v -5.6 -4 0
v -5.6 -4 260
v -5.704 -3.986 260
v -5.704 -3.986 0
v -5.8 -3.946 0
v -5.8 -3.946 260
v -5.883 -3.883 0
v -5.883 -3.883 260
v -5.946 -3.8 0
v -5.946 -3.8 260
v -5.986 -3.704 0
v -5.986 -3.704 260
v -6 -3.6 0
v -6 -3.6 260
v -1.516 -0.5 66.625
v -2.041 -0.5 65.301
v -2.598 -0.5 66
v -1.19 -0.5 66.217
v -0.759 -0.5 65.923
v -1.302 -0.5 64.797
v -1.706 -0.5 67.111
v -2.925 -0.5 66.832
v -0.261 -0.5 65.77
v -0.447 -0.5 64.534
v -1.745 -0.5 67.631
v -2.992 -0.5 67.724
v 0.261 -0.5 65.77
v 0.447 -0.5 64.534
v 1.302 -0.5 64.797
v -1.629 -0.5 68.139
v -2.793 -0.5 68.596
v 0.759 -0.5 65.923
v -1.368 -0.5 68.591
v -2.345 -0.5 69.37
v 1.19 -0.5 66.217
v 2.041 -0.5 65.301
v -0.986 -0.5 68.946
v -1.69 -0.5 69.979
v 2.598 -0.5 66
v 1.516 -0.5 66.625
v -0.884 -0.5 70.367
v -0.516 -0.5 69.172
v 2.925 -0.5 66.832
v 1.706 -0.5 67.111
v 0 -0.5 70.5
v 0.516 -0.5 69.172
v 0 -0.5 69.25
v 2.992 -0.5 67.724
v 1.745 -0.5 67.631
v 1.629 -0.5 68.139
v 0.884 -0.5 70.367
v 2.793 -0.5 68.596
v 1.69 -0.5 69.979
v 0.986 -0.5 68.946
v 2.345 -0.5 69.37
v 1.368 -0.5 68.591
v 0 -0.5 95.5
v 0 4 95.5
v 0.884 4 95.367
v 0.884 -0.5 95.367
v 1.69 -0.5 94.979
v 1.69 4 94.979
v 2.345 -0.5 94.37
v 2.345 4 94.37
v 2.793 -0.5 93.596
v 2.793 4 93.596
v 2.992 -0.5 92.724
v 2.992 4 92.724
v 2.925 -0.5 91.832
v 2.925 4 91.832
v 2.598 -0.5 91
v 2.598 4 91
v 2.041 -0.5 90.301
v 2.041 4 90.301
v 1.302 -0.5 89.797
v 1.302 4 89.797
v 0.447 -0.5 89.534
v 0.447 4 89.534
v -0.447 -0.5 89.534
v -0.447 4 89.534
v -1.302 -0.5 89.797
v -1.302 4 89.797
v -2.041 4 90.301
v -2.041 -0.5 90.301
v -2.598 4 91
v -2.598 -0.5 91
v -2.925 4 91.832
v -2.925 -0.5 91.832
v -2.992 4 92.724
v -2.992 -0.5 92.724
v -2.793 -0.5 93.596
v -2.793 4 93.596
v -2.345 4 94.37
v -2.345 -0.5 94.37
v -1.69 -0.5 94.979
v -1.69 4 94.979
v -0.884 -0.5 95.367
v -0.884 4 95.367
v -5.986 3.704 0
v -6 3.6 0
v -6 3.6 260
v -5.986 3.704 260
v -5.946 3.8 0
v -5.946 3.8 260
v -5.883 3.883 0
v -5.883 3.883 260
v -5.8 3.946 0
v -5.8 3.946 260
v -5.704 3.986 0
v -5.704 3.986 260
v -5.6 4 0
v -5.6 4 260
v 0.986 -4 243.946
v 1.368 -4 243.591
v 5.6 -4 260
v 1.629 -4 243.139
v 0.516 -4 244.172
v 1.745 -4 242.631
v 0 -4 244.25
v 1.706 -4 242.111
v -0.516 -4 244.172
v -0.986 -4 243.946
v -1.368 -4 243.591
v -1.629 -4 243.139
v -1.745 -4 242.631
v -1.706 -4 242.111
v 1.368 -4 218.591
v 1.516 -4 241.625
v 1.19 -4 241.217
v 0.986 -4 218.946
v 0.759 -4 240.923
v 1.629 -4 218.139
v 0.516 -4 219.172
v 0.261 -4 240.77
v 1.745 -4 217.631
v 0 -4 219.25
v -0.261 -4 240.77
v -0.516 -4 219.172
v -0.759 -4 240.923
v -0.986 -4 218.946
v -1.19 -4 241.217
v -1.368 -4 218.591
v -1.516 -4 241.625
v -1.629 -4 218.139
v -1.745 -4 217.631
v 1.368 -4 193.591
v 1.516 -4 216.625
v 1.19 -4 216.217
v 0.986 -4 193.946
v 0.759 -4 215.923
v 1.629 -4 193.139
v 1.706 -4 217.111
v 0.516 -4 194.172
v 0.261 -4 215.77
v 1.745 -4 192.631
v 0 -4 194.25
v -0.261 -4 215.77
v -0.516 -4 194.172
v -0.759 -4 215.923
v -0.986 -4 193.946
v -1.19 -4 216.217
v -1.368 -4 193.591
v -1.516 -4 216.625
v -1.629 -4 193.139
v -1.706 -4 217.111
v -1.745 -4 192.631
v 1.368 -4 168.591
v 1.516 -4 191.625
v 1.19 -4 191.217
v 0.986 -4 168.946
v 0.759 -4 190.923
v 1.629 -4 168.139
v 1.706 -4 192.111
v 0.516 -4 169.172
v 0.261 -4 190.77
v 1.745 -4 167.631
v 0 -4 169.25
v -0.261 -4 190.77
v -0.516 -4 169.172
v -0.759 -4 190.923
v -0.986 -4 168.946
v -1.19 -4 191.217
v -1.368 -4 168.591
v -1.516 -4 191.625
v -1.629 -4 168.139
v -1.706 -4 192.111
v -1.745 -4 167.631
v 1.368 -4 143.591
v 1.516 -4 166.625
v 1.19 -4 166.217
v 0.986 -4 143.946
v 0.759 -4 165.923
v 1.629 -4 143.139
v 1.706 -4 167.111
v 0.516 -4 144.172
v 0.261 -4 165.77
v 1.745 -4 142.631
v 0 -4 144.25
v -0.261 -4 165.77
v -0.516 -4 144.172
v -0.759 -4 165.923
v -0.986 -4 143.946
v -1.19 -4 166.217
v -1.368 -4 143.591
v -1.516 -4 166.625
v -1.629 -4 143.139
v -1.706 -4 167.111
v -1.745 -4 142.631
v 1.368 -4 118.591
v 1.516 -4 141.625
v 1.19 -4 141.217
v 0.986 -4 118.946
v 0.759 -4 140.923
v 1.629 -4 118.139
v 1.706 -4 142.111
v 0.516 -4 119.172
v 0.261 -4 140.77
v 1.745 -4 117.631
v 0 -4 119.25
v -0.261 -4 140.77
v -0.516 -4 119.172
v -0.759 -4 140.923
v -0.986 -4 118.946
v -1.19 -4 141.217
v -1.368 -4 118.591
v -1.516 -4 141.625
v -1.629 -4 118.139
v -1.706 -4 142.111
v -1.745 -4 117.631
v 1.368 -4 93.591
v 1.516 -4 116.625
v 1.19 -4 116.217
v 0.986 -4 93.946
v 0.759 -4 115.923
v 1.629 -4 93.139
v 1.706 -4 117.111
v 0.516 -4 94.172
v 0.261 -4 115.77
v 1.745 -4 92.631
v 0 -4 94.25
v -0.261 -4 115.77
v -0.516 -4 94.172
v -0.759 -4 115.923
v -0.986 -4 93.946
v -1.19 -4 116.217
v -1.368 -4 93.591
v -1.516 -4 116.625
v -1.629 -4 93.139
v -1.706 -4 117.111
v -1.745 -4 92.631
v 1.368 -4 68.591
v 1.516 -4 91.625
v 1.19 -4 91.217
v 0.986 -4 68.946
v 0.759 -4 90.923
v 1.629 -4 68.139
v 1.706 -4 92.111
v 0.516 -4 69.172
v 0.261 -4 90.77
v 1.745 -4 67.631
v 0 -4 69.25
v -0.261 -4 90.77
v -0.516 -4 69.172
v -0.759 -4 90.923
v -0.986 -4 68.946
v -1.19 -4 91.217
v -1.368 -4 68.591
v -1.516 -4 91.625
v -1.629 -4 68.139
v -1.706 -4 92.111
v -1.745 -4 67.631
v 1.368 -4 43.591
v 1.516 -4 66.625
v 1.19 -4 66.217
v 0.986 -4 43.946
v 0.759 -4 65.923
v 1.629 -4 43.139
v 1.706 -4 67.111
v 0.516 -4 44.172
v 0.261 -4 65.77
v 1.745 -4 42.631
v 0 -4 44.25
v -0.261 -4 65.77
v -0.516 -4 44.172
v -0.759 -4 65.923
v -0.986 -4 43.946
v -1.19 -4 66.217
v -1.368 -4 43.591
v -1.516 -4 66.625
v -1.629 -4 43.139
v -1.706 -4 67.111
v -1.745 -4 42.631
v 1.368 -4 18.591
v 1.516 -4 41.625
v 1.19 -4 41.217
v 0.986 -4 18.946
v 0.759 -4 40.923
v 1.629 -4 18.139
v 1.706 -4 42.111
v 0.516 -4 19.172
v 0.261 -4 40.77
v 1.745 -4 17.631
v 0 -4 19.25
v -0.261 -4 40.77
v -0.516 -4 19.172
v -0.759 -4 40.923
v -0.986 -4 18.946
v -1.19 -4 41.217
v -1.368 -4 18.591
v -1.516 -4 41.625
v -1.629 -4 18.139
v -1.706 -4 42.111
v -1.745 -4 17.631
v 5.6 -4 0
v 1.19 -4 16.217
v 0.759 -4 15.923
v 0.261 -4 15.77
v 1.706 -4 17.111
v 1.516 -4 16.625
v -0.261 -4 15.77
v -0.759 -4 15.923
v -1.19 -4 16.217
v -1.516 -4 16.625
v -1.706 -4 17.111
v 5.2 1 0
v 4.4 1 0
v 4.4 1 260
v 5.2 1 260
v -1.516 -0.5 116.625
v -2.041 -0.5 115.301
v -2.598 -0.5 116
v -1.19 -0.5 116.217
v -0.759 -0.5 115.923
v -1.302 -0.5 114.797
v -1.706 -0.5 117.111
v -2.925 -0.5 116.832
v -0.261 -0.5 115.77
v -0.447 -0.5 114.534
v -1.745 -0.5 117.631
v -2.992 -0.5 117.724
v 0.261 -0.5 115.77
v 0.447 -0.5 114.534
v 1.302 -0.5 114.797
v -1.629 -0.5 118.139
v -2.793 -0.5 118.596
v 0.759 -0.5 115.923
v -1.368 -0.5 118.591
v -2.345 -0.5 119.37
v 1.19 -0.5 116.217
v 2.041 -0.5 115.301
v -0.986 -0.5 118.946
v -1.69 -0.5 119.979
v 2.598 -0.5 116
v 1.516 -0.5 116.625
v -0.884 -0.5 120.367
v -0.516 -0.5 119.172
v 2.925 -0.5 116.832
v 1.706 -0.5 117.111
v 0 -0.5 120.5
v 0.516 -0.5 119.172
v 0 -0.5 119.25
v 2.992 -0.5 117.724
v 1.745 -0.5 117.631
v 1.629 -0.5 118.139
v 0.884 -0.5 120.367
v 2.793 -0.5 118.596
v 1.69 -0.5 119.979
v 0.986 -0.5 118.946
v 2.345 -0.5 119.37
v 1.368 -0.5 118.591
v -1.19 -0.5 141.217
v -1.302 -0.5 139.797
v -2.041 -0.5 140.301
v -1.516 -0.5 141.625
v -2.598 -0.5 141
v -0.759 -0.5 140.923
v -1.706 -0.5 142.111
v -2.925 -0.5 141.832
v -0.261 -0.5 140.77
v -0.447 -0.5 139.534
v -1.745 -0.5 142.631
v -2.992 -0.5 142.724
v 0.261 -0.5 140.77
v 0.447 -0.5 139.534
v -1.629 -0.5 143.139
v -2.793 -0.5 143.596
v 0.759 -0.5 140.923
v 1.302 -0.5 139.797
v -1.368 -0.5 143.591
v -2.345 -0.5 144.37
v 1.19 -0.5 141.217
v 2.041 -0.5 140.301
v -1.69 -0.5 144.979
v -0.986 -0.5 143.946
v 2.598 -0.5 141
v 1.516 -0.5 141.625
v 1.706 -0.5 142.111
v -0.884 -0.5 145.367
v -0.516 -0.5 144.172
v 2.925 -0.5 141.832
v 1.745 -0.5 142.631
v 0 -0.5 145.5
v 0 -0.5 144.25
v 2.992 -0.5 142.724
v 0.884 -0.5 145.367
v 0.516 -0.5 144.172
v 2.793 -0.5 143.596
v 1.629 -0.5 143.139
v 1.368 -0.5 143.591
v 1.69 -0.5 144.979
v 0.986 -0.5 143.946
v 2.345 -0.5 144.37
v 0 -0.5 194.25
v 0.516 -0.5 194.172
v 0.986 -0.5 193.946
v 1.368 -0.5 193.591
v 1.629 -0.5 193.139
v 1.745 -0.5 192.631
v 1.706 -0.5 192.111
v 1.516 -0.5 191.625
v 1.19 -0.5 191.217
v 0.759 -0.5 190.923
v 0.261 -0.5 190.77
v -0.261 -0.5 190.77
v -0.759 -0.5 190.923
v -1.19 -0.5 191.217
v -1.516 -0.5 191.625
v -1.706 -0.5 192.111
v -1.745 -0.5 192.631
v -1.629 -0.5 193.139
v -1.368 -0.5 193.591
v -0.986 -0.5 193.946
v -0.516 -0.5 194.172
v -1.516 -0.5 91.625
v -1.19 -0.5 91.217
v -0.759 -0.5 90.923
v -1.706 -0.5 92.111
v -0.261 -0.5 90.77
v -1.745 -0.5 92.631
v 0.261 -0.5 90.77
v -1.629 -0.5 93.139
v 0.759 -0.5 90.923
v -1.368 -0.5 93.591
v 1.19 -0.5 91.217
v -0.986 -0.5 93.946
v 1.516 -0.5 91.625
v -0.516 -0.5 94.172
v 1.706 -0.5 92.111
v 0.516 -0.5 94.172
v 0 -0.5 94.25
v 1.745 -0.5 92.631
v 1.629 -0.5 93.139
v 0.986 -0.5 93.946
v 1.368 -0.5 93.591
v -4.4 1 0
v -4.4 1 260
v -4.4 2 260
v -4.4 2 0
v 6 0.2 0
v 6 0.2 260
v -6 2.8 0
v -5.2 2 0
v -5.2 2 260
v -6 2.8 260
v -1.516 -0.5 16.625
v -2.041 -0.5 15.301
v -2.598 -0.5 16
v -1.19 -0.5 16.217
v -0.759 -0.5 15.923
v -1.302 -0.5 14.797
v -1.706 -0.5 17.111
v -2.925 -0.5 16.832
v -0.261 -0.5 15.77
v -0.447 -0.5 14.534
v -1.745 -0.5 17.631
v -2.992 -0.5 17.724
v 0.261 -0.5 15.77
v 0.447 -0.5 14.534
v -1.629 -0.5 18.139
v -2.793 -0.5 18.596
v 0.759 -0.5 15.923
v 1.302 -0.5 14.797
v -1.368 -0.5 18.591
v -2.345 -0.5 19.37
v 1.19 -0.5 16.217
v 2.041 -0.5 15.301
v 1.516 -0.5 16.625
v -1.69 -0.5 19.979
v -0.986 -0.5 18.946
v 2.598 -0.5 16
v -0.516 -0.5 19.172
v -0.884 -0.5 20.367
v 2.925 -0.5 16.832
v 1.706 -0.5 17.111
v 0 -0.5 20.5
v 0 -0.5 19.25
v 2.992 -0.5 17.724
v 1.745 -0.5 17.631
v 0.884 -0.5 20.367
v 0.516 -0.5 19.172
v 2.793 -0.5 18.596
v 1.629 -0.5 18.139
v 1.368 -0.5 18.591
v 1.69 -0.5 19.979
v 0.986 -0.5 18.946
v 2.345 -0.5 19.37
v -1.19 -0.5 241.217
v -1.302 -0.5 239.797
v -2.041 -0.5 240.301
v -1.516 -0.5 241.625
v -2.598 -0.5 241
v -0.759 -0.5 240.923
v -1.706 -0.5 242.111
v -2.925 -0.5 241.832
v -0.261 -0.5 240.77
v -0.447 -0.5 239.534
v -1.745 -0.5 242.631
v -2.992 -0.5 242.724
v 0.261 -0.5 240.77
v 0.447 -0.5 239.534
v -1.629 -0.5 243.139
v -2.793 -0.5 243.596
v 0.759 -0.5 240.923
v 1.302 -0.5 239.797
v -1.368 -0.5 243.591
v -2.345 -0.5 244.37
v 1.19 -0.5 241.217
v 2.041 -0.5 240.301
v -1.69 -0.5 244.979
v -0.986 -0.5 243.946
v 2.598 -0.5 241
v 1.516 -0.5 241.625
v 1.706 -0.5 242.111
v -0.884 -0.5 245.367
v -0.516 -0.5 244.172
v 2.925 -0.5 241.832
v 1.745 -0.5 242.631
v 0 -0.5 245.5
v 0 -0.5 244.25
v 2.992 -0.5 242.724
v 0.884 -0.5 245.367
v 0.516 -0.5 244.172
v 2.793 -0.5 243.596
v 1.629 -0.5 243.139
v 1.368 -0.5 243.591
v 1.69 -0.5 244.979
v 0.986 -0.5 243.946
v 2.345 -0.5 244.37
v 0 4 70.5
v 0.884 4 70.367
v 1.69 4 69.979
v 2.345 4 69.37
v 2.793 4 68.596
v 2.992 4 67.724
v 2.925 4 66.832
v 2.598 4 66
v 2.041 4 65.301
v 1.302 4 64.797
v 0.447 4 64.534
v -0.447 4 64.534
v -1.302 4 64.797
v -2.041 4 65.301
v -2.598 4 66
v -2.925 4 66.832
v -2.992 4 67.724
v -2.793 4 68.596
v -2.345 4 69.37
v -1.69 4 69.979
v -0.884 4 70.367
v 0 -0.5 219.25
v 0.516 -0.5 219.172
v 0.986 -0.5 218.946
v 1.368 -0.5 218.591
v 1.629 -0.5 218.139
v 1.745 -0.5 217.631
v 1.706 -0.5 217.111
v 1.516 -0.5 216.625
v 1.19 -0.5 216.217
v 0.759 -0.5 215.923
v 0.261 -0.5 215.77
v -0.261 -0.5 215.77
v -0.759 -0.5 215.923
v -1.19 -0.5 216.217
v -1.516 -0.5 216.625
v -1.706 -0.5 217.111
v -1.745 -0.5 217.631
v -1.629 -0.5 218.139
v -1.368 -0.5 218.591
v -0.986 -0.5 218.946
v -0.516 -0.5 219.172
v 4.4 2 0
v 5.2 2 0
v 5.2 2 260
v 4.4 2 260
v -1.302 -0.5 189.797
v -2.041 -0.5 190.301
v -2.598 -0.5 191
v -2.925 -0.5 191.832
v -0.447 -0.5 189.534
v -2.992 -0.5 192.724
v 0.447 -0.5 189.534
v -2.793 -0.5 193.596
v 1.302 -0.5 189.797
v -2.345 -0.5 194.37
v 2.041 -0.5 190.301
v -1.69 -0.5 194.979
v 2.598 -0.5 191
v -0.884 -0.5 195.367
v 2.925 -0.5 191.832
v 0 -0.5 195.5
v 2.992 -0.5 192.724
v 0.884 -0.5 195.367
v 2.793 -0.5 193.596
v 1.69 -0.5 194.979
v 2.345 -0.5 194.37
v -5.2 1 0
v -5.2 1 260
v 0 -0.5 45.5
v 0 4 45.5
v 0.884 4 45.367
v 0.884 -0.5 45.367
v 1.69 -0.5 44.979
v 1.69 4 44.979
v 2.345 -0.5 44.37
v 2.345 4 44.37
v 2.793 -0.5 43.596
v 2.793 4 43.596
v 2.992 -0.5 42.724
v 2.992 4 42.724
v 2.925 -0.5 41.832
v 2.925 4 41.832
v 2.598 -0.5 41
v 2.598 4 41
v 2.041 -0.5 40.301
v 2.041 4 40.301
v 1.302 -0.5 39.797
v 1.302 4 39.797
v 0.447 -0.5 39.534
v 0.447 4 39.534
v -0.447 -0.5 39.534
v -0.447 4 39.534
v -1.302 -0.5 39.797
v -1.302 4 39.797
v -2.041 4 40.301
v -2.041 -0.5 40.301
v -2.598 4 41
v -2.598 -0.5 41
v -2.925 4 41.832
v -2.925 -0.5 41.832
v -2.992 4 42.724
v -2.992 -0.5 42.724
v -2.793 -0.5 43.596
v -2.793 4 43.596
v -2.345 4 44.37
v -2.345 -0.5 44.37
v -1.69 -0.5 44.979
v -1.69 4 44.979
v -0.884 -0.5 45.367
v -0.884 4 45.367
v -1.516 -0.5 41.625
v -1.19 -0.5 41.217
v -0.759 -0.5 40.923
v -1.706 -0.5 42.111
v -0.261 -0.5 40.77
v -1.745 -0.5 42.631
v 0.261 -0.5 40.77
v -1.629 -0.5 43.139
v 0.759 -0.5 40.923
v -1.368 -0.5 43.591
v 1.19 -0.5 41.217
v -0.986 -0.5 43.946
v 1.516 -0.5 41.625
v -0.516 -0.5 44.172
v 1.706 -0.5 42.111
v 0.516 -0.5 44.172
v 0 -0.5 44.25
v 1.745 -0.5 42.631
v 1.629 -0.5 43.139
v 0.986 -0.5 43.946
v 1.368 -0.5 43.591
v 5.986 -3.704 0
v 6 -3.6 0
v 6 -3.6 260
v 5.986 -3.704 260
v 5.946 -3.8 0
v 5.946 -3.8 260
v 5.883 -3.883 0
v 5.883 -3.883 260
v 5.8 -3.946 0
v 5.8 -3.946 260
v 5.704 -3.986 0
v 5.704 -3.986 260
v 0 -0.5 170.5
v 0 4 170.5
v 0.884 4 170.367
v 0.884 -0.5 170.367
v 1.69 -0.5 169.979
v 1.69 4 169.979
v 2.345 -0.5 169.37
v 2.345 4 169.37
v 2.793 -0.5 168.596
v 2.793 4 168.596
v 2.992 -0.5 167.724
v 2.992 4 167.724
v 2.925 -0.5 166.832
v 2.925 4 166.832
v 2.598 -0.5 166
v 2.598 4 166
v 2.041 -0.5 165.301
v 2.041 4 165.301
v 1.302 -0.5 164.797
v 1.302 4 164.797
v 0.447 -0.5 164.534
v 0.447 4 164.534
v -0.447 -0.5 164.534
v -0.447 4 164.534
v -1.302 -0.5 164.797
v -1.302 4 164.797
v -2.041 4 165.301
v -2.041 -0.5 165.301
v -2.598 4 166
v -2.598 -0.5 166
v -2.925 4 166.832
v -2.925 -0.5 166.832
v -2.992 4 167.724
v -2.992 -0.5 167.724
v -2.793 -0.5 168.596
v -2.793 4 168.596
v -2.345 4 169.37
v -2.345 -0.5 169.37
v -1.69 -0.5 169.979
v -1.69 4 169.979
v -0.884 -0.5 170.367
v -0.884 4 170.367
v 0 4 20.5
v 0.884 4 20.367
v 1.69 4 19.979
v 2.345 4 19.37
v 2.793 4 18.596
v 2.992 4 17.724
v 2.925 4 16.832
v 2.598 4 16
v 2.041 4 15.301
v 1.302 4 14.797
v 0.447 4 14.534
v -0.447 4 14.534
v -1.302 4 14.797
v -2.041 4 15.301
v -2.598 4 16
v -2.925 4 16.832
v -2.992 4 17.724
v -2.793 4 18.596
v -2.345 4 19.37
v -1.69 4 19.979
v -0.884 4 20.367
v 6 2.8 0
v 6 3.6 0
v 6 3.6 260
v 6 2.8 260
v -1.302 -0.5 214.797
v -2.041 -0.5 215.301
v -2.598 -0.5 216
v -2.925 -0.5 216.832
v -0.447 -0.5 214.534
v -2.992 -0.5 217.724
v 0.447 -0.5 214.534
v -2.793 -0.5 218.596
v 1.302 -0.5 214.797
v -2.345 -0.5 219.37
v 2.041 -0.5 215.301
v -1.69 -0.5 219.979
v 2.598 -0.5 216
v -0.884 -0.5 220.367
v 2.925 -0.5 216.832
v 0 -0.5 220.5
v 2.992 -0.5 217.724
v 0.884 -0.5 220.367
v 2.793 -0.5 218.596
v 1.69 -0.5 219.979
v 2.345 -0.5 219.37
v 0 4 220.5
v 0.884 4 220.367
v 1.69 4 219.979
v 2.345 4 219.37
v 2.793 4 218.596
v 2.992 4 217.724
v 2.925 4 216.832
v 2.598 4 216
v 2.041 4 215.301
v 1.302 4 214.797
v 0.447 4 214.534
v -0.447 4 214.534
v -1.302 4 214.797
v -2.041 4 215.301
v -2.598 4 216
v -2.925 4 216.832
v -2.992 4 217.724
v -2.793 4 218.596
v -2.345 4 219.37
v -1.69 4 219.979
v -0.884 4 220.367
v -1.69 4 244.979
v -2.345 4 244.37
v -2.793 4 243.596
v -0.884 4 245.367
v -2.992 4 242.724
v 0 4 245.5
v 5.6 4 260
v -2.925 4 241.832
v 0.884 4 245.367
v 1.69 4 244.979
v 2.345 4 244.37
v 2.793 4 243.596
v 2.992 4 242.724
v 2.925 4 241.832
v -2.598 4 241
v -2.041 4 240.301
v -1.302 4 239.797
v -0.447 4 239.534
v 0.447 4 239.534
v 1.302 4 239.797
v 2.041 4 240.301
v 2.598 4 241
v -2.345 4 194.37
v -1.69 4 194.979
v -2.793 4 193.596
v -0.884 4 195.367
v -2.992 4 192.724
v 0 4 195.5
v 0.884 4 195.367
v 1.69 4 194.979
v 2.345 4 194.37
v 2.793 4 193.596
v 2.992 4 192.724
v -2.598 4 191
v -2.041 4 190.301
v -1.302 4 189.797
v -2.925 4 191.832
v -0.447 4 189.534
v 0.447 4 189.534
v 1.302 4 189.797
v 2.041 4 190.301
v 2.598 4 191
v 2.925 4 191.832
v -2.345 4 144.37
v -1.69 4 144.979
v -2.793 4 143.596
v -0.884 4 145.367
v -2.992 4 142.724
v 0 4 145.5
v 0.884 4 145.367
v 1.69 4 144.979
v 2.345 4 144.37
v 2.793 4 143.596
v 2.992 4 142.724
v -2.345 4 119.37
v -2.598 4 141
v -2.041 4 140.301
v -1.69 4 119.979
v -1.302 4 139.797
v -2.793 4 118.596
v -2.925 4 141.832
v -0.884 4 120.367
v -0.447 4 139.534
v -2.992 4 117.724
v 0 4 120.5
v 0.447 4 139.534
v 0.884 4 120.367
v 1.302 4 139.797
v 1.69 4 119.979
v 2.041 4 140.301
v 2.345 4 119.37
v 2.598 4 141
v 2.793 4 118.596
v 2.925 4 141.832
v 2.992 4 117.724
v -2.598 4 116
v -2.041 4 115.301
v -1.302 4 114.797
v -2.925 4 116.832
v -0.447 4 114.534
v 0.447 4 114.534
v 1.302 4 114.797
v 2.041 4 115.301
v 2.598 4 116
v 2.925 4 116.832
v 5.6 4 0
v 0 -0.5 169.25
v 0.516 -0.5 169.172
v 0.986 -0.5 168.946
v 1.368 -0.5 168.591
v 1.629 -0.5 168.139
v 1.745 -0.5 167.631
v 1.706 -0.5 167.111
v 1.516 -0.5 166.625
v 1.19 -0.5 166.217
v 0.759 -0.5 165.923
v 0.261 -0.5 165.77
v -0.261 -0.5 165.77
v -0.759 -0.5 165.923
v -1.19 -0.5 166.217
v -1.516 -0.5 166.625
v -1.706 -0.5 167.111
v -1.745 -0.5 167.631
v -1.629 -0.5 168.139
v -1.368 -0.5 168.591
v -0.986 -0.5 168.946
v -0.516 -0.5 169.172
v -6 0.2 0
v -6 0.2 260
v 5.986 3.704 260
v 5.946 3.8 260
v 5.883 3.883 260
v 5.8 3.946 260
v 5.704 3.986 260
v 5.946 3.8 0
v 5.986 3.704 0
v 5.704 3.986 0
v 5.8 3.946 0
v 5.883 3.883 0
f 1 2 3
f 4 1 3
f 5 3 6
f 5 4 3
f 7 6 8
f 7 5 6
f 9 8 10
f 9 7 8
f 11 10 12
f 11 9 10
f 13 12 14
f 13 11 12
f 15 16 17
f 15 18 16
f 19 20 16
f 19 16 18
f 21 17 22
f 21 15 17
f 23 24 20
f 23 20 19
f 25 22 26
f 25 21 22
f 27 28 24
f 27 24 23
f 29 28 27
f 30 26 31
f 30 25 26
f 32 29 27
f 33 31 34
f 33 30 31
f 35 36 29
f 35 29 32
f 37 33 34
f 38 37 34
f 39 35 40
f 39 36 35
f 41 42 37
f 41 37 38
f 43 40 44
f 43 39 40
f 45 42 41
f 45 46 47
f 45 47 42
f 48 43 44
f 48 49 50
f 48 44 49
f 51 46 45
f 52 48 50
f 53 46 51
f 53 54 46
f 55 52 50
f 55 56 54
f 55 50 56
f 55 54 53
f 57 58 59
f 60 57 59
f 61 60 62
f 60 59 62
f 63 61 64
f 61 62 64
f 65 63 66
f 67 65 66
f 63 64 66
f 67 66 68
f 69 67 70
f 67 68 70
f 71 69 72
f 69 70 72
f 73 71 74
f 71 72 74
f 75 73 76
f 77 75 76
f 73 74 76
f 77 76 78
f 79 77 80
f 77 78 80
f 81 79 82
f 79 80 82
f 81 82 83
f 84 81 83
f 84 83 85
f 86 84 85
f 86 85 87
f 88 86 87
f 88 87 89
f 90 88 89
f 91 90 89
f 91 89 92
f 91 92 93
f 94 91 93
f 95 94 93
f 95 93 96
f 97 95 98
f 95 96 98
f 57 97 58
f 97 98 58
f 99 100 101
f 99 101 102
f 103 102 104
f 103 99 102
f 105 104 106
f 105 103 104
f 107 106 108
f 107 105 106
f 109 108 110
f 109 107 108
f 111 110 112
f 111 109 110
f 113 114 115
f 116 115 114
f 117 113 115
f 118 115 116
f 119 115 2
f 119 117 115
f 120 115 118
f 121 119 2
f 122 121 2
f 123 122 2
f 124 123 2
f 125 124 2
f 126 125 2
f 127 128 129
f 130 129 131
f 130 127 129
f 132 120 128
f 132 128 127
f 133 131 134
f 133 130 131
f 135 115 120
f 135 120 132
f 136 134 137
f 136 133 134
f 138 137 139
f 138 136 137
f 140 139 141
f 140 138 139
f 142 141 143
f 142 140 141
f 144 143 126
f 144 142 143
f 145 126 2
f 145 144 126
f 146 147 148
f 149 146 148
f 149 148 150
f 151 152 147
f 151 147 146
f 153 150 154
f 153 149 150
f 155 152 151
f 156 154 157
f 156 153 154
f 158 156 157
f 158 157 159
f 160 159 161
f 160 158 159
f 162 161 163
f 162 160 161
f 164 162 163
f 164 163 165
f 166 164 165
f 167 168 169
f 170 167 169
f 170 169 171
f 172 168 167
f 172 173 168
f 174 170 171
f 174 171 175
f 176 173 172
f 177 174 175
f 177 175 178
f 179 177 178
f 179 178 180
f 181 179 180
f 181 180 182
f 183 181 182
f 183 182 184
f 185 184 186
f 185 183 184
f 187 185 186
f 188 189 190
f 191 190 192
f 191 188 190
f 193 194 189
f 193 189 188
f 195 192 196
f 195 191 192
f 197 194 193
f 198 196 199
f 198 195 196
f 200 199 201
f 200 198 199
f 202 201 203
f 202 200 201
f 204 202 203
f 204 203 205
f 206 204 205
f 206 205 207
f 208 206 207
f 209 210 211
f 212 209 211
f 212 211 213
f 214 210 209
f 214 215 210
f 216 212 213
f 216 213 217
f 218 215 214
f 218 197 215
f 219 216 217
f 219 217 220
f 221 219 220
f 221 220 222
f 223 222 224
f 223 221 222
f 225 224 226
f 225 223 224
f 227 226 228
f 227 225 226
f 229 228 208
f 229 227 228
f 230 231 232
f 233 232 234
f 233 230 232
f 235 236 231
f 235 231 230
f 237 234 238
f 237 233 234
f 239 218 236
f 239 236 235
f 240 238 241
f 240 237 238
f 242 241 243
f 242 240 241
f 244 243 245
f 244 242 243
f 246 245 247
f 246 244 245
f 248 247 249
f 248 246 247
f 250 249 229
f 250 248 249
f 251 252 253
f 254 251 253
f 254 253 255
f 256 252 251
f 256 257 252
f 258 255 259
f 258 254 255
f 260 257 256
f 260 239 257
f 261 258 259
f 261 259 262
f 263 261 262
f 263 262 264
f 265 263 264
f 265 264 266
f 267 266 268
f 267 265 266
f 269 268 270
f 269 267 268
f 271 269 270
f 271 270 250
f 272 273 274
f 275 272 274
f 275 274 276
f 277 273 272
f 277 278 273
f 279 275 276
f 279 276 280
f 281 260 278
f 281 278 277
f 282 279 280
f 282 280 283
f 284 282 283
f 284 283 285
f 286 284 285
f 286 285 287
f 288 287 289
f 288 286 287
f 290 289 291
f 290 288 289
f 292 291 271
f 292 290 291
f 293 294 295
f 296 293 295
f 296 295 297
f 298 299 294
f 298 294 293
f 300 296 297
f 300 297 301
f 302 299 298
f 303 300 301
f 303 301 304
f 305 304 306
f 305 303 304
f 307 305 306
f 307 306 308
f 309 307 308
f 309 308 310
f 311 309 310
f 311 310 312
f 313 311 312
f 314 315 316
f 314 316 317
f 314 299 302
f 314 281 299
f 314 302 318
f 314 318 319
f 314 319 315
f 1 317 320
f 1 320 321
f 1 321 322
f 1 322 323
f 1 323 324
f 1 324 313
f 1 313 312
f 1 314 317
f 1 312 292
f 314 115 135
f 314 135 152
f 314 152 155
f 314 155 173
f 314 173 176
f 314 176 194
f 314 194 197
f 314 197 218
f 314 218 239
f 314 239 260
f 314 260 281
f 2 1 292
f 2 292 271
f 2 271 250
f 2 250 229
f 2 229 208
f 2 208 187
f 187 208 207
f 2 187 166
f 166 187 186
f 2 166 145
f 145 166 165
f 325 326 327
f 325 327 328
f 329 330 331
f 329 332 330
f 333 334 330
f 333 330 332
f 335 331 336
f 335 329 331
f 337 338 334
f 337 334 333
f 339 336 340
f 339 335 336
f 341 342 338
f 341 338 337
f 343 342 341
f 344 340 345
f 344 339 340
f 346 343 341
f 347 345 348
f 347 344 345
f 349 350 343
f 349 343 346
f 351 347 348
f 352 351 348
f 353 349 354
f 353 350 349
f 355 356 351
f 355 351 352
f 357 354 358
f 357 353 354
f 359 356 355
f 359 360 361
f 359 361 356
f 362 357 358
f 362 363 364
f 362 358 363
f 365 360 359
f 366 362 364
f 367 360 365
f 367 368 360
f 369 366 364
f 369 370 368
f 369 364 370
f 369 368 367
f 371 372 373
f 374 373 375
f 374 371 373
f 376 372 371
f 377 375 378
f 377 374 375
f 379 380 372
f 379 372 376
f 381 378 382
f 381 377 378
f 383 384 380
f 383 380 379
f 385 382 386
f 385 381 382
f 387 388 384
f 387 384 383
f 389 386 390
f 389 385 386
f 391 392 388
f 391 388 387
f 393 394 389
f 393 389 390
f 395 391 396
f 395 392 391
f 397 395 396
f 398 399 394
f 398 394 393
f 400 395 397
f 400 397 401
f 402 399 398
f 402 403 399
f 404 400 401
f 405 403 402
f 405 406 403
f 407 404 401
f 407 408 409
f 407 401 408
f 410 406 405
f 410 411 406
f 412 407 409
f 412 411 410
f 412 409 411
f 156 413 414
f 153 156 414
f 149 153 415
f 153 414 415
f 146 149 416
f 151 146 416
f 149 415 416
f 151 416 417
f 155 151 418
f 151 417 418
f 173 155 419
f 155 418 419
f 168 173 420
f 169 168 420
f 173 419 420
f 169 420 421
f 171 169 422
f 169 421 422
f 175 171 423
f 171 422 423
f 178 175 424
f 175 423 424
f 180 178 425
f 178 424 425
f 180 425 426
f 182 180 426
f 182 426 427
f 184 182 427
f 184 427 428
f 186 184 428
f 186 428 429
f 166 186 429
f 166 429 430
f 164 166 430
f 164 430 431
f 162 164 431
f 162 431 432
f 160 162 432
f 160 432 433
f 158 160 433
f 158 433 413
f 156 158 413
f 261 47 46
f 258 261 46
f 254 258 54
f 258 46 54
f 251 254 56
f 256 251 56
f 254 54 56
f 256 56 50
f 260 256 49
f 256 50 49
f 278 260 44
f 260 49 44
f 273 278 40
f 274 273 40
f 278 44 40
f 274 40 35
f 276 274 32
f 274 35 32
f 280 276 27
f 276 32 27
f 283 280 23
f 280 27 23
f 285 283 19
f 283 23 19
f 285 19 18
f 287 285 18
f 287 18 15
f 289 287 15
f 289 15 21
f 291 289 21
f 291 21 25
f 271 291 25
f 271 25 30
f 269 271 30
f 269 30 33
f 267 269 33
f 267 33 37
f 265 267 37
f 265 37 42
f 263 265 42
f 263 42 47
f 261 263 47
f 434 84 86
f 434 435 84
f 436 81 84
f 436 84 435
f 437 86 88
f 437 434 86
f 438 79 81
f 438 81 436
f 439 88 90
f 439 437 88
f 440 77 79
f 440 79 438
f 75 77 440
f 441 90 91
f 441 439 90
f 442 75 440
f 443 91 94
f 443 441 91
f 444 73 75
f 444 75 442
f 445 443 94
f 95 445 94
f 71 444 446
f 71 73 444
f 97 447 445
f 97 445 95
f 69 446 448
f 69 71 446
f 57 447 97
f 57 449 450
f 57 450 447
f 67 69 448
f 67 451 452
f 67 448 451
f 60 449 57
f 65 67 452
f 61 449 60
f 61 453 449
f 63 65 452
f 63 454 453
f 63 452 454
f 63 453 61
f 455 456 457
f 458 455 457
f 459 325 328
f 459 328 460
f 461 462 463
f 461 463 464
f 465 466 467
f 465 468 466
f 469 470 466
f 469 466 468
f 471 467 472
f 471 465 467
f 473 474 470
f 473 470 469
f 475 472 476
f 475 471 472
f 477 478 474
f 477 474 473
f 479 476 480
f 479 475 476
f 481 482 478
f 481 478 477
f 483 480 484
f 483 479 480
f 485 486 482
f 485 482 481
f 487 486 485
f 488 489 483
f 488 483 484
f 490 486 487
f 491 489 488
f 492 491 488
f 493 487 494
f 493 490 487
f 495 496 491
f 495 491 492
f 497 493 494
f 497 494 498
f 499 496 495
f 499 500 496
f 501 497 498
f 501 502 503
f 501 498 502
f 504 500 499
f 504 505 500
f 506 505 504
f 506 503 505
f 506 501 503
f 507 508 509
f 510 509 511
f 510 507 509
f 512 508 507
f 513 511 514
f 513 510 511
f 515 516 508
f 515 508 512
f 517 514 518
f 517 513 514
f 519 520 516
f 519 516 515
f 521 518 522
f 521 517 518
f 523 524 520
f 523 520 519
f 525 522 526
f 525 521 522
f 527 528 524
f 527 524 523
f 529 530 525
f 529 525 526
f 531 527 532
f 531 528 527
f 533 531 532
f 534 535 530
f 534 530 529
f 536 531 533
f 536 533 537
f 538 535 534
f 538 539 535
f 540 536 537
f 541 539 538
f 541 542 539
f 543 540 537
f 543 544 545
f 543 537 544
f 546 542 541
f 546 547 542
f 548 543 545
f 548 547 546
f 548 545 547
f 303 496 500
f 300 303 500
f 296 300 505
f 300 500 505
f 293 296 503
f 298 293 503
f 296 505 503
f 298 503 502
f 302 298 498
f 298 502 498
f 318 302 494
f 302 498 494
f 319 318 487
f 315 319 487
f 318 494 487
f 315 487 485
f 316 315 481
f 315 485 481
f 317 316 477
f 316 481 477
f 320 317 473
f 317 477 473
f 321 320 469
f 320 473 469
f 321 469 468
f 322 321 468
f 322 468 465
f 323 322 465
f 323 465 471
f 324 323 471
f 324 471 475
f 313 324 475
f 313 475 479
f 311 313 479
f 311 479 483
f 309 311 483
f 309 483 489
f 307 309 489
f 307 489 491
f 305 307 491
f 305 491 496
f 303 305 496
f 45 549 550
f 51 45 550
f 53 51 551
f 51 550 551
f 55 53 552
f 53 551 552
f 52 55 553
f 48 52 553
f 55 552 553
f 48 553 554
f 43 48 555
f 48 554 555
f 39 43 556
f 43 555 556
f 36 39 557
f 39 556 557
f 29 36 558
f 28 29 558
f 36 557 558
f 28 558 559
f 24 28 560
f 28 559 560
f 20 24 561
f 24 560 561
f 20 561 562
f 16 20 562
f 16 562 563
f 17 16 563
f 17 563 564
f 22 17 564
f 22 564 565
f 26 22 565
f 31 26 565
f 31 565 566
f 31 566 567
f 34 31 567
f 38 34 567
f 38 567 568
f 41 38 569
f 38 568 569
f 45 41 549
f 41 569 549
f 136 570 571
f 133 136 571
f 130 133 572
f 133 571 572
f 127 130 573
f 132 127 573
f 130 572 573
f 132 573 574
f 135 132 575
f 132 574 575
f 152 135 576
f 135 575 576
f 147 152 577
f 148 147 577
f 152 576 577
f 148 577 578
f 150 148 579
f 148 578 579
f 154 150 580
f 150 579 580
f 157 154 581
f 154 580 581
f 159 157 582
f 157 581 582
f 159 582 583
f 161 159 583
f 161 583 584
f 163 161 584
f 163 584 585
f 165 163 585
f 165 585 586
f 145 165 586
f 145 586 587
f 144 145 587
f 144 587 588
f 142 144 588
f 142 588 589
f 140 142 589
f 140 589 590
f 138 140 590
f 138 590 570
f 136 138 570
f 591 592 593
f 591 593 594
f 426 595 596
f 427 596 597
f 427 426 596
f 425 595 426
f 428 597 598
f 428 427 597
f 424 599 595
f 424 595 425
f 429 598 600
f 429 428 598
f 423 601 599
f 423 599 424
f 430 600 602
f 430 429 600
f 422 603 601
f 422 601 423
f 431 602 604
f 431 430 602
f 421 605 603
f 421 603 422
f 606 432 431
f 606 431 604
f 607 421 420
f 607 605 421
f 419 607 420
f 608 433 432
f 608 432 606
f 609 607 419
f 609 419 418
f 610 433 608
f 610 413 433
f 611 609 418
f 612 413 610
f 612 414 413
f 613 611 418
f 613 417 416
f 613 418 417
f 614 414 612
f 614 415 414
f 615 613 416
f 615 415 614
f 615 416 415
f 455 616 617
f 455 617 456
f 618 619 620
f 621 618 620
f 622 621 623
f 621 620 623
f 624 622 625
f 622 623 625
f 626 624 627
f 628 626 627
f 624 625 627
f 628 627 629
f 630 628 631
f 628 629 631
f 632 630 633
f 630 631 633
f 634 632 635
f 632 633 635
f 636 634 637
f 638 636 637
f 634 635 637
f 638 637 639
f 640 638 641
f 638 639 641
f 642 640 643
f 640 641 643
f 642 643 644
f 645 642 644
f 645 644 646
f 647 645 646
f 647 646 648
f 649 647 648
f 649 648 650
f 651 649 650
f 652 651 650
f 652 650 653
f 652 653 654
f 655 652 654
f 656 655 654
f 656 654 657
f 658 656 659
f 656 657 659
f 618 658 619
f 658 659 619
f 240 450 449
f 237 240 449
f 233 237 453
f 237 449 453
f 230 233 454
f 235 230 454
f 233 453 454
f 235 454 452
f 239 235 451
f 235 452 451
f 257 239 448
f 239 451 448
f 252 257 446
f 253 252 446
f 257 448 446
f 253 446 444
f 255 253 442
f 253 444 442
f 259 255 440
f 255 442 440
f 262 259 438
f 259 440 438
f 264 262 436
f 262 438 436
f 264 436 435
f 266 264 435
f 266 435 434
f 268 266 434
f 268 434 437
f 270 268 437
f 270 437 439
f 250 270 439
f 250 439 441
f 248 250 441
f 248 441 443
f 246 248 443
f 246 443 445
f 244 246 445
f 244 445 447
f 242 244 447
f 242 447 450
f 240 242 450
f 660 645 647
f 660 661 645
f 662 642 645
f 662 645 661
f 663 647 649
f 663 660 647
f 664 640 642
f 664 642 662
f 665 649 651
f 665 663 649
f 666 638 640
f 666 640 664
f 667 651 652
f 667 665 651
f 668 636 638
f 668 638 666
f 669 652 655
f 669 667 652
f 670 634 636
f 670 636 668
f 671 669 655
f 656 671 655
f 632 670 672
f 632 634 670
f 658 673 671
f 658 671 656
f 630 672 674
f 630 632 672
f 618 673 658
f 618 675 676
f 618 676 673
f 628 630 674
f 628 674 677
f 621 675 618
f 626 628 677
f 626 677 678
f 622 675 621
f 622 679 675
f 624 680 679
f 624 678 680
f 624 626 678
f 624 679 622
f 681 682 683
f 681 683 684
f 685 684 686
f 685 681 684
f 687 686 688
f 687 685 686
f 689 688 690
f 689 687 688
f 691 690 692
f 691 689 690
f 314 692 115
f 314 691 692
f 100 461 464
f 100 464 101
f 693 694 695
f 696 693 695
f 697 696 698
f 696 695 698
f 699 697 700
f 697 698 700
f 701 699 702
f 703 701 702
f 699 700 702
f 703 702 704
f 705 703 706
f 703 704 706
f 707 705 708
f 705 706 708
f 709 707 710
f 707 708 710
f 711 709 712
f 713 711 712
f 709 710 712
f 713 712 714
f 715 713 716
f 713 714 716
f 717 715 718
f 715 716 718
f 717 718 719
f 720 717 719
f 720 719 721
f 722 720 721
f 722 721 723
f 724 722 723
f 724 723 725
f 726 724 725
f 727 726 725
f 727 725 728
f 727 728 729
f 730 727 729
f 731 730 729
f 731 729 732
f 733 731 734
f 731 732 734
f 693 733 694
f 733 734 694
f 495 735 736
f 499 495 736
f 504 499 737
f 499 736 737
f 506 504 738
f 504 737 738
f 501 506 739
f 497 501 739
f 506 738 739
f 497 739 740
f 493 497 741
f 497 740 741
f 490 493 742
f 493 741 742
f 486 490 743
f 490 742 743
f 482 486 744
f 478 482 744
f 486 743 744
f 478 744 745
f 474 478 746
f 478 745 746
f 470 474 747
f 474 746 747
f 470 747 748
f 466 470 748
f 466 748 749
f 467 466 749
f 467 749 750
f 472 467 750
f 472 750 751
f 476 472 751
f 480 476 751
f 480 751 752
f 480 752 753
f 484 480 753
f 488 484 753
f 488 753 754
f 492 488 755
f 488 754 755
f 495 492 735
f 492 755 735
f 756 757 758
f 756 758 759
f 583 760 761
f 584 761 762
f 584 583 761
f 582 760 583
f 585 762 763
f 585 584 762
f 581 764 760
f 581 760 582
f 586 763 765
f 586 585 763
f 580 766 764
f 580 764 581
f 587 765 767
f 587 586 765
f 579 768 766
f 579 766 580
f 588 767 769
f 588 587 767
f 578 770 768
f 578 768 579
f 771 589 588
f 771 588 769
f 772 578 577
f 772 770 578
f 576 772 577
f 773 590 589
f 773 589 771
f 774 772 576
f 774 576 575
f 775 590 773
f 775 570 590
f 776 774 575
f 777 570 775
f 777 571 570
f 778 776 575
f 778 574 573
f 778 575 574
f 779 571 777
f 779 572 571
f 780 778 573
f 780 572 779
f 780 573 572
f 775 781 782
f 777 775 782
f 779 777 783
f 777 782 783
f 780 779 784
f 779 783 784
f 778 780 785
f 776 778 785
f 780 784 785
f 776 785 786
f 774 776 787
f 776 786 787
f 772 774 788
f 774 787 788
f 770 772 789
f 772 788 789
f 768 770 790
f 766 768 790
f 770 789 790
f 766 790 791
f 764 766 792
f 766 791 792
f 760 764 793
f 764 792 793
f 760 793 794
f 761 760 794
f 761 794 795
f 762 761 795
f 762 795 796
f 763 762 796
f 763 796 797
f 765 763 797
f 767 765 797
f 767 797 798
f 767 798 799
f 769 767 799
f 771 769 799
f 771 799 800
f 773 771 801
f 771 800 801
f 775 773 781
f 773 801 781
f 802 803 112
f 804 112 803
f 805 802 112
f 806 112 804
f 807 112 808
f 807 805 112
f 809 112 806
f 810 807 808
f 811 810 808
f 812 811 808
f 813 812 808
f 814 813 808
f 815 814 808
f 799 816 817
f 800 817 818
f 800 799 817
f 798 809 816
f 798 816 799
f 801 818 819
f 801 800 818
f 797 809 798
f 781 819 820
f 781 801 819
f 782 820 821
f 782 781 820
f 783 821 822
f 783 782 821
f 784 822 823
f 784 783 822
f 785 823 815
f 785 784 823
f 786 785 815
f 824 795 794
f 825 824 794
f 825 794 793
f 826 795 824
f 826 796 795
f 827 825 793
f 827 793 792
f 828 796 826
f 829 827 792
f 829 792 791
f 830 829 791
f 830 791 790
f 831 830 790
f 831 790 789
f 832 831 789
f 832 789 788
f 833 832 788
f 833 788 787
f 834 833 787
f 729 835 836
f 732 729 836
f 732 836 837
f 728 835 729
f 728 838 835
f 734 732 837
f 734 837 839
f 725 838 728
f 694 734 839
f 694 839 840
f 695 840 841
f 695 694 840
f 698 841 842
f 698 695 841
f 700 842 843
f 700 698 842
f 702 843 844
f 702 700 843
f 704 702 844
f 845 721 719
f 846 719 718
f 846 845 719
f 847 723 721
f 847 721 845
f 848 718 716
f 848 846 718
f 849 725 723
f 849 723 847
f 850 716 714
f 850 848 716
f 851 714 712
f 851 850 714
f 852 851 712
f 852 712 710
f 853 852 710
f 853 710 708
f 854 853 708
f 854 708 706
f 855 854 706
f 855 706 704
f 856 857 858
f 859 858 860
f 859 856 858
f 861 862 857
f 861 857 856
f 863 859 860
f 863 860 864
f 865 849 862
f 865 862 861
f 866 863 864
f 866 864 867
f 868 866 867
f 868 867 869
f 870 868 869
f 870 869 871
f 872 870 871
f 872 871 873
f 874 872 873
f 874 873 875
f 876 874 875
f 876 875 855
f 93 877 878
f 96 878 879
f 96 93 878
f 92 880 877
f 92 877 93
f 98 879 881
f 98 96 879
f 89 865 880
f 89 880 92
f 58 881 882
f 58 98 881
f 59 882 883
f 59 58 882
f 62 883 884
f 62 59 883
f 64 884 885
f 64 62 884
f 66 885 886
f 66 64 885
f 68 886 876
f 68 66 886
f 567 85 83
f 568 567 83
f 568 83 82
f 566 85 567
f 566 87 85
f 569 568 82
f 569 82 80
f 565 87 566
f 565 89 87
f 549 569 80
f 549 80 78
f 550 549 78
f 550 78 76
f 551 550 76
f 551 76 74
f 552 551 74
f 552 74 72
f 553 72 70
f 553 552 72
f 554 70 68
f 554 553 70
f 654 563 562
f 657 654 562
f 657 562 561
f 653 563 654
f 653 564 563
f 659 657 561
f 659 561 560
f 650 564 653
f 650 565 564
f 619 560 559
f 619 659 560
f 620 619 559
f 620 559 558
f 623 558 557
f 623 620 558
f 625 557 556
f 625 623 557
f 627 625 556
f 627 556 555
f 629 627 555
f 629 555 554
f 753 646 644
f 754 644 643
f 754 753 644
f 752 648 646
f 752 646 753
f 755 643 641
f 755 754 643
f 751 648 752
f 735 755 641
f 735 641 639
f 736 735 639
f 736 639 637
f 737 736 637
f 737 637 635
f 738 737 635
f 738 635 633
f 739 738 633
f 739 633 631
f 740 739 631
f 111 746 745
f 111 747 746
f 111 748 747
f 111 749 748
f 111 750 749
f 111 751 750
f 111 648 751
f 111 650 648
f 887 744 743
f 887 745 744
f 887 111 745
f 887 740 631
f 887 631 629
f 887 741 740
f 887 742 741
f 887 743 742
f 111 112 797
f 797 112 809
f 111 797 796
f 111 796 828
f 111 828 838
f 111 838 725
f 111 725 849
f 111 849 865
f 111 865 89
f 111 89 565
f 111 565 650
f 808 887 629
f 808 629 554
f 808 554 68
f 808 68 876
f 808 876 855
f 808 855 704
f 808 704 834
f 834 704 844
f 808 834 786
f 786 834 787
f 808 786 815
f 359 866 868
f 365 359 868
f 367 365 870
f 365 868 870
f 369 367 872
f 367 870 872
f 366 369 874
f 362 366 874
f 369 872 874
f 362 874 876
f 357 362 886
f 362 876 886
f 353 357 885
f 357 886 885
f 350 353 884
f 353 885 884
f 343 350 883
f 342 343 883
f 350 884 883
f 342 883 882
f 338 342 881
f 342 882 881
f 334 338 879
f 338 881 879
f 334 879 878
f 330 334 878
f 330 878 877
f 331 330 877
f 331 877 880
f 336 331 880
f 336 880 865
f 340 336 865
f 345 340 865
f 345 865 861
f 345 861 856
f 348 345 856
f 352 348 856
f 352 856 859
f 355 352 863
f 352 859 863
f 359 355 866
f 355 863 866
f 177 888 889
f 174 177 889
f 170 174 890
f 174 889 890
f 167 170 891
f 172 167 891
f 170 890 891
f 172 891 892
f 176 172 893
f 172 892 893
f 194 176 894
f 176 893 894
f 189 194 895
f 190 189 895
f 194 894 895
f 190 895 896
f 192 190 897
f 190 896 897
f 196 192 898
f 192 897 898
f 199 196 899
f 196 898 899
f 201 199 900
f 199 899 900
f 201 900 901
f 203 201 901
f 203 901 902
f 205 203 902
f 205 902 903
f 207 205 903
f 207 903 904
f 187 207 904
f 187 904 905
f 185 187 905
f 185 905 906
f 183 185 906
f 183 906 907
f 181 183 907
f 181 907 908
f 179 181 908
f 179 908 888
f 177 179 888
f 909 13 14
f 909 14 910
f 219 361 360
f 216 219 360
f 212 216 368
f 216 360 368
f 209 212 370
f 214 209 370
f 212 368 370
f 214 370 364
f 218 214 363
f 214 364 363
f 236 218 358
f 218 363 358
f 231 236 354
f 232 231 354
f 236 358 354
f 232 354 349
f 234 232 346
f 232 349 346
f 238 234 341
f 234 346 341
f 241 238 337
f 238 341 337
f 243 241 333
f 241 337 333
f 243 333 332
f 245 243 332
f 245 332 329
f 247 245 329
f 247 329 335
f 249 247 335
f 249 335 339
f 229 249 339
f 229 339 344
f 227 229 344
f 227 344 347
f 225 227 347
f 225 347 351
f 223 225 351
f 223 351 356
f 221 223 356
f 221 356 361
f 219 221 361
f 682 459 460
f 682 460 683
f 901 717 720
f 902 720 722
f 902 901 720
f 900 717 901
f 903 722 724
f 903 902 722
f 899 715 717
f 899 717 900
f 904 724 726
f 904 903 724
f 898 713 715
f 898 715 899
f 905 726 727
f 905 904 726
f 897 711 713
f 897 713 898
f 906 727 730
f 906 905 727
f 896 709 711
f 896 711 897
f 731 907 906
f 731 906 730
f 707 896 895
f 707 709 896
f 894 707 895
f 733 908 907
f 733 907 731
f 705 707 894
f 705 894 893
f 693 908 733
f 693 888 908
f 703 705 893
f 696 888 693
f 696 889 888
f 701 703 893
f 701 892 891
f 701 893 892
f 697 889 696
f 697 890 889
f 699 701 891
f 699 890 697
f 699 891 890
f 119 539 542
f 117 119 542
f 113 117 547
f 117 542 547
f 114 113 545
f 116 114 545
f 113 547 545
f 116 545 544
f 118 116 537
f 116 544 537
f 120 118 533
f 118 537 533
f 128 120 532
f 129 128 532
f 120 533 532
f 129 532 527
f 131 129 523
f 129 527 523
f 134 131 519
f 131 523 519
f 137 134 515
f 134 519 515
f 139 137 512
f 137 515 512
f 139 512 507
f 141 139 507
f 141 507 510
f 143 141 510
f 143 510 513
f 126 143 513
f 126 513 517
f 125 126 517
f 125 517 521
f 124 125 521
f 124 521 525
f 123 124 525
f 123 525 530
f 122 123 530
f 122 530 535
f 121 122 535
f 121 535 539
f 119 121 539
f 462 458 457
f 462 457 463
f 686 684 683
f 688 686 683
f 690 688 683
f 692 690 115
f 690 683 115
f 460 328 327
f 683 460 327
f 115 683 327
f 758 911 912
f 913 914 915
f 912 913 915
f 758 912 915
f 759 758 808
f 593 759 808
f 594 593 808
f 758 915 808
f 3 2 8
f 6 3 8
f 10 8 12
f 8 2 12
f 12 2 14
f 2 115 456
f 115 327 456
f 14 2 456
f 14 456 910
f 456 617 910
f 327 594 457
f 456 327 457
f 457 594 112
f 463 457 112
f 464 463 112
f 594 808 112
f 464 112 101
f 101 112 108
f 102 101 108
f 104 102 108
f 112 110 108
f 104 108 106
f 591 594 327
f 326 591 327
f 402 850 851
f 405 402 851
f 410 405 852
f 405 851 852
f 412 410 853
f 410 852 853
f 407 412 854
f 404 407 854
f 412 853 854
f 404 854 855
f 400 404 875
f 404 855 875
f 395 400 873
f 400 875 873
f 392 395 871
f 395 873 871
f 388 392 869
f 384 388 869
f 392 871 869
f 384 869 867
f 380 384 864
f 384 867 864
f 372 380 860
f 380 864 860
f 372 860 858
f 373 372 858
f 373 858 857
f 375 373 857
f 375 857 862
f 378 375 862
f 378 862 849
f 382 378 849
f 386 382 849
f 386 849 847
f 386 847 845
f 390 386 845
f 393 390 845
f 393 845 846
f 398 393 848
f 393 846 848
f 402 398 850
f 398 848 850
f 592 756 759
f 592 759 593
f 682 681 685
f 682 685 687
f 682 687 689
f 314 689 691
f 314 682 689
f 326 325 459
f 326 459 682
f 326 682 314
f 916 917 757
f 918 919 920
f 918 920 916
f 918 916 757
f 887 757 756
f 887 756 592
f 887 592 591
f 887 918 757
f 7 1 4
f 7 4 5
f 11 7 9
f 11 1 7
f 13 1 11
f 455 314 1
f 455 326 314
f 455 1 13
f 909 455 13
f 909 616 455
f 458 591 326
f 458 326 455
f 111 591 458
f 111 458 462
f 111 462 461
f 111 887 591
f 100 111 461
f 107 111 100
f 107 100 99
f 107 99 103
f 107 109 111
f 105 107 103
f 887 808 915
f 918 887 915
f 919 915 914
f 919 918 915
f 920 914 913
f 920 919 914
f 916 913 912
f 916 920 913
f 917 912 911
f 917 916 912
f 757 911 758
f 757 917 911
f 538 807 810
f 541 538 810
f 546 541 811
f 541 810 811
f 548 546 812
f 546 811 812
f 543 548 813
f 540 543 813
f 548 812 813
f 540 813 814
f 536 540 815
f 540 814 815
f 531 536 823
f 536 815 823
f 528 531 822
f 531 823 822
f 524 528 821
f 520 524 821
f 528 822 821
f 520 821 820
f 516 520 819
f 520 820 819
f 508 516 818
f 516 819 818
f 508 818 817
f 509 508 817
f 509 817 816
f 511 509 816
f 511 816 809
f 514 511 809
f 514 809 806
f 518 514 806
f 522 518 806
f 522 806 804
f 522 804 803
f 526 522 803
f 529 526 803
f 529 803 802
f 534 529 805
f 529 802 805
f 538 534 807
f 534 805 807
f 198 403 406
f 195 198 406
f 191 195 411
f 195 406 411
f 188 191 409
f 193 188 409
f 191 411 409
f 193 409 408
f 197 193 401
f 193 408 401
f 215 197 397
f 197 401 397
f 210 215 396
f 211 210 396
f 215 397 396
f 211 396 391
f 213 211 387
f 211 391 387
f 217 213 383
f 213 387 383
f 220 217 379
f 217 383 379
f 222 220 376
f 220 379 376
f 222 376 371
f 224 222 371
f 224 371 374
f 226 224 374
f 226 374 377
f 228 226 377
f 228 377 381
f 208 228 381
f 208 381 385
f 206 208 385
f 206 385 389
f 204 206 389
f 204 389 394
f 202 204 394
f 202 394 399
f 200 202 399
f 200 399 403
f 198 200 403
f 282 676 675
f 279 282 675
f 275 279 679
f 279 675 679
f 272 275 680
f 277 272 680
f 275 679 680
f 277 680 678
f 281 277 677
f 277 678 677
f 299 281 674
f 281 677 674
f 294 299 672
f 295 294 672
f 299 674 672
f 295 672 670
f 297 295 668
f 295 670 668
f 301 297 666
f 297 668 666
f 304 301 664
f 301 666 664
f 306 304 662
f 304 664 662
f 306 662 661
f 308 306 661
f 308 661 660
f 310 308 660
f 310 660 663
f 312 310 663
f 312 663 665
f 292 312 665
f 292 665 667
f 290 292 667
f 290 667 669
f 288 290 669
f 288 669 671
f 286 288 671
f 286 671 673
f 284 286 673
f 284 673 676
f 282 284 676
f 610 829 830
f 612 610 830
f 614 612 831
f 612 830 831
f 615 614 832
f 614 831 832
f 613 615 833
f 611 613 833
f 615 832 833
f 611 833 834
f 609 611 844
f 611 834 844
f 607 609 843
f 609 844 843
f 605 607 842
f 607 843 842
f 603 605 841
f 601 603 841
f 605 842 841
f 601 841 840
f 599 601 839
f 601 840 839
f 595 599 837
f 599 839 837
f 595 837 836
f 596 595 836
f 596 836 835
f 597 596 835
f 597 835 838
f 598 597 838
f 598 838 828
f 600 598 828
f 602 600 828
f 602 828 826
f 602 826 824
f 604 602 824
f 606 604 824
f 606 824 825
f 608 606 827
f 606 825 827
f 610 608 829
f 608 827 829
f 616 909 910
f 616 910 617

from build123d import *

# Parameters (mm, degrees)
BOSS_EXTRUDE1_DEPTH = 260
SKETCH2_R           = 3
CUT_EXTRUDE1_DEPTH  = 4.5
SKETCH3_R           = 1.75
CUT_EXTRUDE2_DEPTH  = 261.192236625


with BuildPart() as part:
    # Sketch1 → Boss-Extrude1 (new body)
    with BuildSketch(Plane.XY):
        with BuildLine():
            Line((-5.6, 4), (5.6, 4))
            ThreePointArc((5.6, 4), (5.882842712, 3.882842712), (6, 3.6))
            Line((6, 3.6), (6, 2.8))
            Line((6, 2.8), (5.2, 2))
            Line((5.2, 2), (4.4, 2))
            Line((4.4, 2), (4.4, 1))
            Line((4.4, 1), (5.2, 1))
            Line((5.2, 1), (6, 0.2))
            Line((6, 0.2), (6, -3.6))
            ThreePointArc((6, -3.6), (5.882842712, -3.882842712), (5.6, -4))
            Line((5.6, -4), (-5.6, -4))
            ThreePointArc((-5.6, -4), (-5.882842712, -3.882842712), (-6, -3.6))
            Line((-6, -3.6), (-6, 0.2))
            Line((-6, 0.2), (-5.2, 1))
            Line((-5.2, 1), (-4.4, 1))
            Line((-4.4, 1), (-4.4, 2))
            Line((-4.4, 2), (-5.2, 2))
            Line((-5.2, 2), (-6, 2.8))
            Line((-6, 2.8), (-6, 3.6))
            ThreePointArc((-6, 3.6), (-5.882842712, 3.882842712), (-5.6, 4))
        make_face()
    extrude(amount=BOSS_EXTRUDE1_DEPTH)

    # Sketch2 → Cut-Extrude1 (cut)
    with BuildSketch(Plane(origin=(0, 4, 0), x_dir=(1, 0, 0), z_dir=(0, 1, 0))):
        with Locations(Location((0, -242.5, 0), (0, 0, 270))):
            Circle(SKETCH2_R)
        with Locations(Location((0, -217.5, 0), (0, 0, 270))):
            Circle(SKETCH2_R)
        with Locations(Location((0, -192.5, 0), (0, 0, 270))):
            Circle(SKETCH2_R)
        with Locations(Location((0, -167.5, 0), (0, 0, 270))):
            Circle(SKETCH2_R)
        with Locations(Location((0, -142.5, 0), (0, 0, 270))):
            Circle(SKETCH2_R)
        with Locations(Location((0, -117.5, 0), (0, 0, 270))):
            Circle(SKETCH2_R)
        with Locations(Location((0, -92.5, 0), (0, 0, 270))):
            Circle(SKETCH2_R)
        with Locations(Location((0, -67.5, 0), (0, 0, 270))):
            Circle(SKETCH2_R)
        with Locations(Location((0, -42.5, 0), (0, 0, 270))):
            Circle(SKETCH2_R)
        with Locations(Location((0, -17.5, 0), (0, 0, 270))):
            Circle(SKETCH2_R)
        with Locations((0, 7.5)):
            Circle(SKETCH2_R)
        with Locations((0, 32.5)):
            Circle(SKETCH2_R)
        with Locations((0, 57.5)):
            Circle(SKETCH2_R)
        with Locations((0, 82.5)):
            Circle(SKETCH2_R)
        with Locations((0, 107.5)):
            Circle(SKETCH2_R)
        with Locations((0, 132.5)):
            Circle(SKETCH2_R)
        with Locations((0, 157.5)):
            Circle(SKETCH2_R)
        with Locations((0, 182.5)):
            Circle(SKETCH2_R)
    extrude(amount=-CUT_EXTRUDE1_DEPTH, mode=Mode.SUBTRACT)

    # Sketch3 → Cut-Extrude2 (cut, through all)
    with BuildSketch(Plane(origin=(0, 4, 0), x_dir=(1, 0, 0), z_dir=(0, 1, 0))):
        with Locations(Location((0, -242.5, 0), (0, 0, 270))):
            Circle(SKETCH3_R)
        with Locations(Location((0, -217.5, 0), (0, 0, 270))):
            Circle(SKETCH3_R)
        with Locations(Location((0, -192.5, 0), (0, 0, 270))):
            Circle(SKETCH3_R)
        with Locations(Location((0, -167.5, 0), (0, 0, 270))):
            Circle(SKETCH3_R)
        with Locations(Location((0, -142.5, 0), (0, 0, 270))):
            Circle(SKETCH3_R)
        with Locations(Location((0, -117.5, 0), (0, 0, 270))):
            Circle(SKETCH3_R)
        with Locations(Location((0, -92.5, 0), (0, 0, 270))):
            Circle(SKETCH3_R)
        with Locations(Location((0, -67.5, 0), (0, 0, 270))):
            Circle(SKETCH3_R)
        with Locations(Location((0, -42.5, 0), (0, 0, 270))):
            Circle(SKETCH3_R)
        with Locations(Location((0, -17.5, 0), (0, 0, 270))):
            Circle(SKETCH3_R)
        with Locations((0, 7.5)):
            Circle(SKETCH3_R)
        with Locations((0, 32.5)):
            Circle(SKETCH3_R)
        with Locations((0, 57.5)):
            Circle(SKETCH3_R)
        with Locations((0, 82.5)):
            Circle(SKETCH3_R)
        with Locations((0, 107.5)):
            Circle(SKETCH3_R)
    extrude(amount=-CUT_EXTRUDE2_DEPTH, mode=Mode.SUBTRACT)


solid = part.part
